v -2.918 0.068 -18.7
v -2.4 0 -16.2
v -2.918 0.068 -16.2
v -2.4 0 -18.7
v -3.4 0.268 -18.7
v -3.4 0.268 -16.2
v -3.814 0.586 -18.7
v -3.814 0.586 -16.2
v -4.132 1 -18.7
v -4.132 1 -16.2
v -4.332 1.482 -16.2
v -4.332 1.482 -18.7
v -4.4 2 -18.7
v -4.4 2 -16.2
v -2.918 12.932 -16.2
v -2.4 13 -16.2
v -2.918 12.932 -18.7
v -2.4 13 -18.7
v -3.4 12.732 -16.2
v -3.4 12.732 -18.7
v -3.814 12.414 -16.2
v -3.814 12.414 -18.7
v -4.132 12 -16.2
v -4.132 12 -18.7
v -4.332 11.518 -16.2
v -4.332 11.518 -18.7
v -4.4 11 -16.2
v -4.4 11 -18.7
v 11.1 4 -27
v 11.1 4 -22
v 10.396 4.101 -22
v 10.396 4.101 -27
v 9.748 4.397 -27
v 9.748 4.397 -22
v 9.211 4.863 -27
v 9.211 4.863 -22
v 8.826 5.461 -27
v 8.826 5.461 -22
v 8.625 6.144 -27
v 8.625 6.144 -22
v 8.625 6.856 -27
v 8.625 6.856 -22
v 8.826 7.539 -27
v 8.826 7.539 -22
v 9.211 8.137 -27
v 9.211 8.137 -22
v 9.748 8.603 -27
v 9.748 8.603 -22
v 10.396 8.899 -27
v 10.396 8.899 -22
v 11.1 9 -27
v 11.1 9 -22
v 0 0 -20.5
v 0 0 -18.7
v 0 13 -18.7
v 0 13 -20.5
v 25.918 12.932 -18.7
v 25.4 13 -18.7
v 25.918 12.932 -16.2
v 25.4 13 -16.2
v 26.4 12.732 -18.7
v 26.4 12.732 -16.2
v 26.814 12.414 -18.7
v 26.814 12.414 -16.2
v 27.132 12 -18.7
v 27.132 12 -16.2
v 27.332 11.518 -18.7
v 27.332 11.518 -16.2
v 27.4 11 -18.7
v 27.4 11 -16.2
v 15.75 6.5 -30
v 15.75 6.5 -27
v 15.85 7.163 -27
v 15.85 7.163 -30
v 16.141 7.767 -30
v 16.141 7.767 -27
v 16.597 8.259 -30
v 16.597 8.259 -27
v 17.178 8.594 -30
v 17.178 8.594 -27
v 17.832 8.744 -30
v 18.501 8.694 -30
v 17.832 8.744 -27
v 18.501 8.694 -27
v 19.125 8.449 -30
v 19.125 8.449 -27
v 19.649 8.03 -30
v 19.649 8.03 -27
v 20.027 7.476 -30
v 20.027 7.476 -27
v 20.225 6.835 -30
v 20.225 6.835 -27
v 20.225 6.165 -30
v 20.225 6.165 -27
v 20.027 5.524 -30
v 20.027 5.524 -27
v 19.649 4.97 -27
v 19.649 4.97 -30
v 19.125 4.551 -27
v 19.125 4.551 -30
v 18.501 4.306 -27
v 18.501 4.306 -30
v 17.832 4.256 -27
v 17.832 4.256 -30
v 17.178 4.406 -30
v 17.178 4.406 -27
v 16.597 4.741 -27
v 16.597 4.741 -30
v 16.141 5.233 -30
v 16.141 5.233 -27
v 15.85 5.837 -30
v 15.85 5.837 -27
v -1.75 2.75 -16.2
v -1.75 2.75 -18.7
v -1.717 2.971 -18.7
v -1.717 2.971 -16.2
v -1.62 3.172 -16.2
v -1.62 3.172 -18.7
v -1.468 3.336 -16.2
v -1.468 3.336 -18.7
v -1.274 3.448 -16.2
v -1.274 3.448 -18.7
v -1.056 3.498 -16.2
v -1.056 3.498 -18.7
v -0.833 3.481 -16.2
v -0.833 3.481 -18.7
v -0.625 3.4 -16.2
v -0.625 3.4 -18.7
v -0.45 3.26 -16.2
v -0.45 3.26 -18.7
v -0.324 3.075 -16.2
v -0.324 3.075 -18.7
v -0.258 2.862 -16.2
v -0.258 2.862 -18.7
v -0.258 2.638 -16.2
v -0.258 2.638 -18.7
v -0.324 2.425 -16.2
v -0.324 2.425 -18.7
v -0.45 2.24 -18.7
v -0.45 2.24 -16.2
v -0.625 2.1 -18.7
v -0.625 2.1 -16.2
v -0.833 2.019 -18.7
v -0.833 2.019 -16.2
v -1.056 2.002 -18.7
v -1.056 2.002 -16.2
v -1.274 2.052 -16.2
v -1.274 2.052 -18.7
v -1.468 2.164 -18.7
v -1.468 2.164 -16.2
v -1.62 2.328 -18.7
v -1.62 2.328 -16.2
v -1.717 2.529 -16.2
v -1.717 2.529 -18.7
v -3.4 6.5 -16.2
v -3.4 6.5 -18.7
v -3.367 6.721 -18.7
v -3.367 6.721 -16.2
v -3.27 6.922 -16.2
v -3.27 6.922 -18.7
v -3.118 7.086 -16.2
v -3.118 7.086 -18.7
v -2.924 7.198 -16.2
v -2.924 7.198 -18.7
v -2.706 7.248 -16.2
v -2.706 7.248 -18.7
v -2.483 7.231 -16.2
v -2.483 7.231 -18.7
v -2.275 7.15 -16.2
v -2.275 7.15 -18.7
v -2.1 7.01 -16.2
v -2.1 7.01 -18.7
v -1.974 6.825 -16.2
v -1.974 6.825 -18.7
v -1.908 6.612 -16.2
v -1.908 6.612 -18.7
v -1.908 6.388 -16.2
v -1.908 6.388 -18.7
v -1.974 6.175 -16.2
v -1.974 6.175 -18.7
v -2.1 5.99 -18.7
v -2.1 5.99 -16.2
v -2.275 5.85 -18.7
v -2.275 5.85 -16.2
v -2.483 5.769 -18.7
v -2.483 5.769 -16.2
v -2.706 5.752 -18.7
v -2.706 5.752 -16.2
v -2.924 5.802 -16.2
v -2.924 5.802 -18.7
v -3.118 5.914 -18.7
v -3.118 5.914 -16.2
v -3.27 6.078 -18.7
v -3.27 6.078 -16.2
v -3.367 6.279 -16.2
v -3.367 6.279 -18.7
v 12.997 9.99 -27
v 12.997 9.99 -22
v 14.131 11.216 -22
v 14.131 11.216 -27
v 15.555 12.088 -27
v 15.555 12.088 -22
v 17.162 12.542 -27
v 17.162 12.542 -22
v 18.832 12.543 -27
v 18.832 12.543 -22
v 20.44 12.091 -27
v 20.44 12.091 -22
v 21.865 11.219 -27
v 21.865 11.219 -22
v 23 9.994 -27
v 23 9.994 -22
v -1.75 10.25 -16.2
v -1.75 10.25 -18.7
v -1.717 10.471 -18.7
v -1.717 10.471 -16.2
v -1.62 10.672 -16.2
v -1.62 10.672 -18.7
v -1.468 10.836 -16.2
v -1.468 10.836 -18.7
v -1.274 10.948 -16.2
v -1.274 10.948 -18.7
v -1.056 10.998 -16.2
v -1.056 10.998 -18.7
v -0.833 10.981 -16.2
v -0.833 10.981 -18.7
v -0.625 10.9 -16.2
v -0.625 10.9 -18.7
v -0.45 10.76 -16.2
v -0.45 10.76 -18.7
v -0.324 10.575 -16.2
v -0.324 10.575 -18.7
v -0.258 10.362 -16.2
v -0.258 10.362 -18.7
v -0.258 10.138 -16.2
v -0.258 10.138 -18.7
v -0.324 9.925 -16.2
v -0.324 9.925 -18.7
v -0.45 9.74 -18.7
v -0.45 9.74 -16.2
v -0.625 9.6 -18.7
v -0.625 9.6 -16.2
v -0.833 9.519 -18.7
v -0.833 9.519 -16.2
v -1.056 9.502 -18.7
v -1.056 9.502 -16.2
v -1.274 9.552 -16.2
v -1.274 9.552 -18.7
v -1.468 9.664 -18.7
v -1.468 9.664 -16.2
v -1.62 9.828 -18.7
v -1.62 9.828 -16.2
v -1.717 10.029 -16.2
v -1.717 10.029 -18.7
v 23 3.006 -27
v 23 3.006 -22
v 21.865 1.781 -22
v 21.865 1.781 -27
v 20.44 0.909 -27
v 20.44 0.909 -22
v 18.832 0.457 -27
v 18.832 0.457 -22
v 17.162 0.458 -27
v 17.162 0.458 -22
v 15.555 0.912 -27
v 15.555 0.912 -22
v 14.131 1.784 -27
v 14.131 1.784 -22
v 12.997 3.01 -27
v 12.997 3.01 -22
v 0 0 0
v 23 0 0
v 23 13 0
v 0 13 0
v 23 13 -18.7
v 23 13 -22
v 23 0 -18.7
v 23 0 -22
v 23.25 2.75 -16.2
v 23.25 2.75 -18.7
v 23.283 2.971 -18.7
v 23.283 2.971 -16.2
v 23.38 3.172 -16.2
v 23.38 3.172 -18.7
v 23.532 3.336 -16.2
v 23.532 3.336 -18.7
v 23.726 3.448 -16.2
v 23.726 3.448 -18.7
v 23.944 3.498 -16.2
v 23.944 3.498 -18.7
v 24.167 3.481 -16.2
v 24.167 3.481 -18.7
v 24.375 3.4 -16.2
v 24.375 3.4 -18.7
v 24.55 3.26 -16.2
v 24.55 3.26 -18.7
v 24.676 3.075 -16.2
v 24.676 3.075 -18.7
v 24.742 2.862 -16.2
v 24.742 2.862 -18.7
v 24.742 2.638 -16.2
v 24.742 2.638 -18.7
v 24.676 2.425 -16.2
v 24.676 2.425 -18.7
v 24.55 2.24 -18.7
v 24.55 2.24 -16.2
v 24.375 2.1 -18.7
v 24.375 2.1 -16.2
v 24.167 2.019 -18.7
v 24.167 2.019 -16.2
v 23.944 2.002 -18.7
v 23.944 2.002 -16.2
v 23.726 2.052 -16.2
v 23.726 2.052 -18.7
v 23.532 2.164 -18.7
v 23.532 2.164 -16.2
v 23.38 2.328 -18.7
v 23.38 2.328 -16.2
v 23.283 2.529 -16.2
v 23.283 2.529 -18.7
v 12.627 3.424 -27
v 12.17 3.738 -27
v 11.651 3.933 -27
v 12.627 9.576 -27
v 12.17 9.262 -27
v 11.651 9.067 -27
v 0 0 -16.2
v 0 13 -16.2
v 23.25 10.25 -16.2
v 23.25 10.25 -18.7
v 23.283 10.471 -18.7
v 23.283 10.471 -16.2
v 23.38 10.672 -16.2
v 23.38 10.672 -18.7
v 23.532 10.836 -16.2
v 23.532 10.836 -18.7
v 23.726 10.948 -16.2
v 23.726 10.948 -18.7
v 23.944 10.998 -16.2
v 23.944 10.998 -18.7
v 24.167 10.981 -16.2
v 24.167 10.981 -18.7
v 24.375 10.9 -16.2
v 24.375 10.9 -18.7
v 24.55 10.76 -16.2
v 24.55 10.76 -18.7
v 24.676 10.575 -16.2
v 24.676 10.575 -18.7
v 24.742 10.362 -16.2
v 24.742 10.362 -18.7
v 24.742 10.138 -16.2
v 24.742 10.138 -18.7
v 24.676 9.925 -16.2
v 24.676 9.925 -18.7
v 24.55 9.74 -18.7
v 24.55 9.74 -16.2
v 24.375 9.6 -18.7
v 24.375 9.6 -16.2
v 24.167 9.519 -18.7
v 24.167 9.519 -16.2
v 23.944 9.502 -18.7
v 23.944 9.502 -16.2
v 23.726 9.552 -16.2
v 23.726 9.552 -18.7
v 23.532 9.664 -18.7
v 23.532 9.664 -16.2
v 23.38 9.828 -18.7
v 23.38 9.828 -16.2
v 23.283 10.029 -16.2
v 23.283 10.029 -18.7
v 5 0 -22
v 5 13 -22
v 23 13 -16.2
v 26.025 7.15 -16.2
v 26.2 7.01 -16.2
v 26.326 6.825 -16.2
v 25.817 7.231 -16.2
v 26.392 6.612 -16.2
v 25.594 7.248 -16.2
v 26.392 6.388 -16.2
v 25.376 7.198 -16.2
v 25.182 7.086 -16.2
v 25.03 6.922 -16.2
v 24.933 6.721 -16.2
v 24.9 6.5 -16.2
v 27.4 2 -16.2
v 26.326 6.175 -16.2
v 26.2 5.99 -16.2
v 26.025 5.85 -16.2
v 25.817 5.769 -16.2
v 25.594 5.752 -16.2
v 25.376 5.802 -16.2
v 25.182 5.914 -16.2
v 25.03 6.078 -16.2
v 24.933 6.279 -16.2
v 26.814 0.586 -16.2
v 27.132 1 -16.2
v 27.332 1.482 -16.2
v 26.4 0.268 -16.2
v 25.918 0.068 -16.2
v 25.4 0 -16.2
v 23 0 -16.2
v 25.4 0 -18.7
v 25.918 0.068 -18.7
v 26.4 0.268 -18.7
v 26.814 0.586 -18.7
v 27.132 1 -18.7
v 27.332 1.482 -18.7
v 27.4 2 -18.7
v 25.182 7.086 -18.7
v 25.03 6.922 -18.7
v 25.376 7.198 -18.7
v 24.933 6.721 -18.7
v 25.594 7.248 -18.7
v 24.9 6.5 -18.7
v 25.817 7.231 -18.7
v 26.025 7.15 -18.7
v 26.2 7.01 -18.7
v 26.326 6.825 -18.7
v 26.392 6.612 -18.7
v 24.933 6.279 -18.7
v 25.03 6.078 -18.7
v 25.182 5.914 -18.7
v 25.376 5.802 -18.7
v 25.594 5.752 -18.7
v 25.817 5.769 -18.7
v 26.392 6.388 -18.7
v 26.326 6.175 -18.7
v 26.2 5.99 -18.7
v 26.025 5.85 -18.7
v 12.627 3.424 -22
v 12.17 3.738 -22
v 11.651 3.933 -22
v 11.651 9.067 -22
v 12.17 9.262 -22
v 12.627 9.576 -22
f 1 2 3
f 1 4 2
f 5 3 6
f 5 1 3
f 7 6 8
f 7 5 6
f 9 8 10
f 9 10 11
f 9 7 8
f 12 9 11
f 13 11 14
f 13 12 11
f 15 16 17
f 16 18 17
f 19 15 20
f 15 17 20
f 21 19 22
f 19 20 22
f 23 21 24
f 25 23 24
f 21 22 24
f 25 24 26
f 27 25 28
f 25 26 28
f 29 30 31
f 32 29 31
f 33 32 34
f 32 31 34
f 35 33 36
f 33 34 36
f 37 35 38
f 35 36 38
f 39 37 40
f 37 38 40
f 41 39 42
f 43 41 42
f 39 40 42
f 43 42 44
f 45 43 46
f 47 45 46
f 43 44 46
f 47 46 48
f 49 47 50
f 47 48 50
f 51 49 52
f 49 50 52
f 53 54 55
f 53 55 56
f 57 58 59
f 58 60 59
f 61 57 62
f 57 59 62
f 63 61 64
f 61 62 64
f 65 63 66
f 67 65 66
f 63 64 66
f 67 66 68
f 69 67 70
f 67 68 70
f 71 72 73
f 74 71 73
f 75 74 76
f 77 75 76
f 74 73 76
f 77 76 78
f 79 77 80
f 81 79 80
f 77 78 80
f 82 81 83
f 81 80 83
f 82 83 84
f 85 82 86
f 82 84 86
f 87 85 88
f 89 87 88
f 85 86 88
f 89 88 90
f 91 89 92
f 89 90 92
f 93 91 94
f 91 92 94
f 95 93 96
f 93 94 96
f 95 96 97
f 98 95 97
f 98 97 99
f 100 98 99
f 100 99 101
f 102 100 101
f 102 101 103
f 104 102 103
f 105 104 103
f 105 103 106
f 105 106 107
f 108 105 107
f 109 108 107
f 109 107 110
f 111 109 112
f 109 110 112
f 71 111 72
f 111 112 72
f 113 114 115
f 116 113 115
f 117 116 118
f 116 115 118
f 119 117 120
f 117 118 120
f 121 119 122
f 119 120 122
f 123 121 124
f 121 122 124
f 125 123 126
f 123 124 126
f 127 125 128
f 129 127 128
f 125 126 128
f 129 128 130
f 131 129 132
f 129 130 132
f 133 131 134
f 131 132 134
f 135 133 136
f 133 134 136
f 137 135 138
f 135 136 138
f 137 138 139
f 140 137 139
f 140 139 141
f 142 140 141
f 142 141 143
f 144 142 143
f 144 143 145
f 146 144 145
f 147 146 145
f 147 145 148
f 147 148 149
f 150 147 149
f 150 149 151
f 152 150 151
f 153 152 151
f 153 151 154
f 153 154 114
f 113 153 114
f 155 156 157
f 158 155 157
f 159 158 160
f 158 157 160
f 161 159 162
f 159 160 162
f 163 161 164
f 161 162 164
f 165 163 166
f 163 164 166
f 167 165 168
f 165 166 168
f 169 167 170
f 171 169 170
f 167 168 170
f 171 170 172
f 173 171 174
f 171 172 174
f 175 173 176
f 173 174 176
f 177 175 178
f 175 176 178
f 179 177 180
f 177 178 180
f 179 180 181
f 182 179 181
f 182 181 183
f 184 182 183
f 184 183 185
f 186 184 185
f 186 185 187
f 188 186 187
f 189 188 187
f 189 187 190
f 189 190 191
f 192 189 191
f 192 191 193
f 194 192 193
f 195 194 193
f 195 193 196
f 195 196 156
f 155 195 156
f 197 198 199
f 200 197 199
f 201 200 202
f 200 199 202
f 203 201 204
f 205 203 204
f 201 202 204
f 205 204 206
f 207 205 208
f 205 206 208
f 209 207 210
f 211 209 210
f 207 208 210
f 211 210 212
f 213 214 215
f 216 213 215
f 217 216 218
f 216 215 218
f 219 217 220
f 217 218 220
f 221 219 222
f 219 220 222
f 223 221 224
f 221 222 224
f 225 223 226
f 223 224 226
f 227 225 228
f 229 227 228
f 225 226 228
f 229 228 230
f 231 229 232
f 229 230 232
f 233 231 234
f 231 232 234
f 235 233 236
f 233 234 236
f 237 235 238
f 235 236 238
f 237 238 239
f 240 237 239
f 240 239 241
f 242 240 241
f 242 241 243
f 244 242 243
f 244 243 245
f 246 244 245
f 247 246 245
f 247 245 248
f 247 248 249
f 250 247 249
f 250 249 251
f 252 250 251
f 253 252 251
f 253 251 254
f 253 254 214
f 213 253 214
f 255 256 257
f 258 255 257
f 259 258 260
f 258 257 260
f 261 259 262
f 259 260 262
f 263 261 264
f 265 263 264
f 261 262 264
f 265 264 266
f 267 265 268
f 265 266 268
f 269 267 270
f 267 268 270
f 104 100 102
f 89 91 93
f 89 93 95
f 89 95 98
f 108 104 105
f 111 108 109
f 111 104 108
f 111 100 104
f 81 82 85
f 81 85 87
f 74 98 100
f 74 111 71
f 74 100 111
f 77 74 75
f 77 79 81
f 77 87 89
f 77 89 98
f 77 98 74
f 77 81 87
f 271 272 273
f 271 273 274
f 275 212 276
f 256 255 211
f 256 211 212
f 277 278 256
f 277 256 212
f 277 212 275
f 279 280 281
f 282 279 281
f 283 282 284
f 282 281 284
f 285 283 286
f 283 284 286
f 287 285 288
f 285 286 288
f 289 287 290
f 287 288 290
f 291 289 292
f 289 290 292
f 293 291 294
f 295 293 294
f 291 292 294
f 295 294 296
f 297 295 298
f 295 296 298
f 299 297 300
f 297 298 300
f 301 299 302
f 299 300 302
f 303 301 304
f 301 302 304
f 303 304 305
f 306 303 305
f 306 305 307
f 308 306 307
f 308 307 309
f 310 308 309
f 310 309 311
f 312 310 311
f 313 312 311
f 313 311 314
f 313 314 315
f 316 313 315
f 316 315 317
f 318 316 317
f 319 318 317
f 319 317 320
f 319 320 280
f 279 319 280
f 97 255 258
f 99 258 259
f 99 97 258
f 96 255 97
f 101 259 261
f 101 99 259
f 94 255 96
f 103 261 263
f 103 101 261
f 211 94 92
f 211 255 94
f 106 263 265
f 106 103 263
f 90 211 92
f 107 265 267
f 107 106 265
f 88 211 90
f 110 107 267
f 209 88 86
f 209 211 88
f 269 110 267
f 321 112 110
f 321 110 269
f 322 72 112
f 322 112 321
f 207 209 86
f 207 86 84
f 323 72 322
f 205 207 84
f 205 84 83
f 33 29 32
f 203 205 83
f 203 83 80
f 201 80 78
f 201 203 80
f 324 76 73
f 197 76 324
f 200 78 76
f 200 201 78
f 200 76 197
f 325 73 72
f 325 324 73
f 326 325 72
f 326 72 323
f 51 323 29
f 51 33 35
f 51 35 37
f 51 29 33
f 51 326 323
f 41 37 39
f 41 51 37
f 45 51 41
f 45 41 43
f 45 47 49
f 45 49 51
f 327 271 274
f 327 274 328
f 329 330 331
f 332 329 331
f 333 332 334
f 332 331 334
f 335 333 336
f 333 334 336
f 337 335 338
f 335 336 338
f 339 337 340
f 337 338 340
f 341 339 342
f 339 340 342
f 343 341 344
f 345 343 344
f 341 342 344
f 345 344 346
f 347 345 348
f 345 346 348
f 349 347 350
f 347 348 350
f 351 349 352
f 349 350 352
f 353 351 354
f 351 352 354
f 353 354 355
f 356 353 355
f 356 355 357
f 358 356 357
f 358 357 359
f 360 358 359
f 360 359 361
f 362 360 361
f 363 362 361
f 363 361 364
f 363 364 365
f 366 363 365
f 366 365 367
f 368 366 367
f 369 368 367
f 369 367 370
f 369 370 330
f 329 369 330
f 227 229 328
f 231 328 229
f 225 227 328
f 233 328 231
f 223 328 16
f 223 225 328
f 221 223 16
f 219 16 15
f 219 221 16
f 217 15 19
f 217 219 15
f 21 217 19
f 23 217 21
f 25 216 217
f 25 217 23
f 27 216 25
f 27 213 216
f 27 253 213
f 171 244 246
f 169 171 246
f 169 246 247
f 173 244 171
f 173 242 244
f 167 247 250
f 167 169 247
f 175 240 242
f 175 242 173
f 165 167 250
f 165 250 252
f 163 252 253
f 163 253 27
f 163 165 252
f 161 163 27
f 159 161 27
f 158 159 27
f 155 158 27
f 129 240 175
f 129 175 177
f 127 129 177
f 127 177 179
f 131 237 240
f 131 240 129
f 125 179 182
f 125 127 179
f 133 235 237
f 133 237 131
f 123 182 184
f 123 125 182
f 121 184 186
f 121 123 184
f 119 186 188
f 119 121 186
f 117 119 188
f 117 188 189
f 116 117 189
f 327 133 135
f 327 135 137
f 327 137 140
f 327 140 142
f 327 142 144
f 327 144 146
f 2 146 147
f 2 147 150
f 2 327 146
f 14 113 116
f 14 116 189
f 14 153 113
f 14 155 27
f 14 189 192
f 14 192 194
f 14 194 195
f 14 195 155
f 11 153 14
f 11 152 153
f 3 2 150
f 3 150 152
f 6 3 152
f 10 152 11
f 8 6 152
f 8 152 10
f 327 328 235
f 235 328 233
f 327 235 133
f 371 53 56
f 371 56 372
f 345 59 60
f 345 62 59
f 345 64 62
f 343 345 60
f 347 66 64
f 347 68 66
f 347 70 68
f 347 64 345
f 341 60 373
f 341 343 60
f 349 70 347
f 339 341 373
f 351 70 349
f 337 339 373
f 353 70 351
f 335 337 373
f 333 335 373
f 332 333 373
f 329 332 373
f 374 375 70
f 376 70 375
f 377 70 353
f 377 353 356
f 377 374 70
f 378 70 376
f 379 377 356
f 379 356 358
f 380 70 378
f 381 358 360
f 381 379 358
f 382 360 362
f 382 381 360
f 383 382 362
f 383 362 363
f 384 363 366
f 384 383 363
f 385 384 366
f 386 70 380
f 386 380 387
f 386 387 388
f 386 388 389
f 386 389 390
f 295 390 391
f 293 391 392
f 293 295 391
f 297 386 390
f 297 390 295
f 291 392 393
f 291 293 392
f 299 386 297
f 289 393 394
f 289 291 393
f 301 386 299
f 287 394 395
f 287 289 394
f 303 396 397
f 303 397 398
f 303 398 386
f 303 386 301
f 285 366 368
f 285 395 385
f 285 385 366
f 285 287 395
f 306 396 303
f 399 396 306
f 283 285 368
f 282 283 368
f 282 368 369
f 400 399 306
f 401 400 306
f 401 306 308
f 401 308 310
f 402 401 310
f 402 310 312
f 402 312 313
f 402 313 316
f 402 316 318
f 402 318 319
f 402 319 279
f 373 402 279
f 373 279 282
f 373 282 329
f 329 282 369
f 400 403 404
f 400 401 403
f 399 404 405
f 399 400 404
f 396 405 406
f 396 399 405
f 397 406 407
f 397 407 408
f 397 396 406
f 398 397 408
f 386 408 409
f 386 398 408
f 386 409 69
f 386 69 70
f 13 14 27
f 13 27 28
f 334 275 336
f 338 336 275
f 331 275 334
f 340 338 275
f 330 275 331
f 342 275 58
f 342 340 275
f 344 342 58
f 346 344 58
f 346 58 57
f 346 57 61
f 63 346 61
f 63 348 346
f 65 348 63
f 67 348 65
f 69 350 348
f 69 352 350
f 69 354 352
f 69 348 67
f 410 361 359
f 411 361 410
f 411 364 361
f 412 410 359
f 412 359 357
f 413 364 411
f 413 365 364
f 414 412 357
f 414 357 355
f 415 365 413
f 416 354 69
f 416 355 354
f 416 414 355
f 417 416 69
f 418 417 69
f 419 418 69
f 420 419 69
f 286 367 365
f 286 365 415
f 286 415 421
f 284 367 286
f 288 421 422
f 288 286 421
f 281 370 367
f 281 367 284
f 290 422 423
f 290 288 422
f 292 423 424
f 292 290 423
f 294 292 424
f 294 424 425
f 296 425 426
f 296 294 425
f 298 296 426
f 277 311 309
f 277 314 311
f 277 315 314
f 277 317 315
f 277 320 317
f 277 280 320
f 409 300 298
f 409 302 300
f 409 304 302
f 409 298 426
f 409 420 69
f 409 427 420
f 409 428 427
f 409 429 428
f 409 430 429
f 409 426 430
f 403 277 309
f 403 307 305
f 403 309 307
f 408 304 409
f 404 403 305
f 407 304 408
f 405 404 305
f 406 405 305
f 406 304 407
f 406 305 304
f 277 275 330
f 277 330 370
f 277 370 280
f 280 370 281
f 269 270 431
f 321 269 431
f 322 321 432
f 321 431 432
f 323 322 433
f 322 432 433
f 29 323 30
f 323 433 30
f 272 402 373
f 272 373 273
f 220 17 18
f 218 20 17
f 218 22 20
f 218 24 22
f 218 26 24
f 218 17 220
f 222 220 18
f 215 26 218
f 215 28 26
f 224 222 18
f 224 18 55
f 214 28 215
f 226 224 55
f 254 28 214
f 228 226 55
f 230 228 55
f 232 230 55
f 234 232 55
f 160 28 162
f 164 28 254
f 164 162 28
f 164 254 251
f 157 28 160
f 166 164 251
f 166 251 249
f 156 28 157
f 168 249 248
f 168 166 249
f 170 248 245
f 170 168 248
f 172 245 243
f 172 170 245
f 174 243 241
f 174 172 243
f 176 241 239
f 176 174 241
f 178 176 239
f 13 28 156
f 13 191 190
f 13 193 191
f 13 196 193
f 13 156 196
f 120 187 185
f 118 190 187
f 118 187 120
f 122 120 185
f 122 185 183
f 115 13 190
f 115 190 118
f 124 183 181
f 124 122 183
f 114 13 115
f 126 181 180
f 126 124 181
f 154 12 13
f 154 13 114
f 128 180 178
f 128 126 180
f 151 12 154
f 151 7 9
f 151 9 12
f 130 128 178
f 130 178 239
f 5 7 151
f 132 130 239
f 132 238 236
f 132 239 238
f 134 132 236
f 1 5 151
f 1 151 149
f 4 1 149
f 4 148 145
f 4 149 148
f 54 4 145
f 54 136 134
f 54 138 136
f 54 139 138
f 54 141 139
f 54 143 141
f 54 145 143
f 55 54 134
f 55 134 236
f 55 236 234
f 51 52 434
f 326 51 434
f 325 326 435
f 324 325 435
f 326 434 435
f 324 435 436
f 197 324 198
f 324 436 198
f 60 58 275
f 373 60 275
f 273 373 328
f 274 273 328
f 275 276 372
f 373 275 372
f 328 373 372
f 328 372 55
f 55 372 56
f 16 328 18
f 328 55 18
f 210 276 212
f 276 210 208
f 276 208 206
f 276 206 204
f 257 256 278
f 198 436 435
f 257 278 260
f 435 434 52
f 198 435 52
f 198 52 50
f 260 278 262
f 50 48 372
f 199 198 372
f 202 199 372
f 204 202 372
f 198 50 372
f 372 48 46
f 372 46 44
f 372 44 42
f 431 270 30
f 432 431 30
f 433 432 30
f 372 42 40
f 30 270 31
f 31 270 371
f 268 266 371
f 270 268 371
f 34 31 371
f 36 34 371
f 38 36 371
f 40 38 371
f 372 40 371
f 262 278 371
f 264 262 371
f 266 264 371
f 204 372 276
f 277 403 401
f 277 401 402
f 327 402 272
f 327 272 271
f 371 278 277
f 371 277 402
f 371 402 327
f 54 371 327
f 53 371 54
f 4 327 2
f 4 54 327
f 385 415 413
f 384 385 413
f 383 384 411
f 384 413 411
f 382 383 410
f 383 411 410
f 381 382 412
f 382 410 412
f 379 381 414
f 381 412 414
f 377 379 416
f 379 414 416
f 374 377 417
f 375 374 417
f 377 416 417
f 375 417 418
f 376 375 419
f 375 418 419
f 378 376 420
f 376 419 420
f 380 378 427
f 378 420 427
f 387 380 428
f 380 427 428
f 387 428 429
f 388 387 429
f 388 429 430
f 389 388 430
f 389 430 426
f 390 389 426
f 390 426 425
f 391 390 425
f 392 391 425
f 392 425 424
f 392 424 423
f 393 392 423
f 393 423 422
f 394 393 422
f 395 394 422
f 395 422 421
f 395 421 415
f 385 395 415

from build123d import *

# Parameters (mm, degrees)
BOSS_EXTRUDE1_DEPTH = 13
BOSS_EXTRUDE2_DEPTH = 5
FILLET1_R           = 2
SKETCH3_R           = 0.75
CUT_EXTRUDE1_DEPTH  = 4.9
SKETCH4_R           = 2.25
BOSS_EXTRUDE3_DEPTH = 3


with BuildPart() as part:
    # Sketch1 → Boss-Extrude1 (new body)
    with BuildSketch(Plane(origin=(0, 0, 0), x_dir=(1, 0, 0), z_dir=(0, 1, 0))):
        Polygon((0, 20.5), (5, 22), (11.5, 22), (23, 22), (23, 18.7), (27.4, 18.7), (27.4, 16.2), (23, 16.2), (23, 0), (0, 0), (0, 16.2), (-4.4, 16.2), (-4.4, 18.7), (0, 18.7), align=None)
    extrude(amount=BOSS_EXTRUDE1_DEPTH)

    # Sketch2 → Boss-Extrude2 (add)
    with BuildSketch(Plane(origin=(0, 0, -22), x_dir=(-1, 0, 0), z_dir=(0, 0, -1))):
        with BuildLine():
            Line((-23, 9.994281042), (-23, 3.005718958))
            ThreePointArc((-23, 3.005718958), (-17.997144773, 0.400000668), (-12.996731055, 3.010401189))
            ThreePointArc((-12.996731055, 3.010401189), (-12.16968389, 3.737727457), (-11.1, 4))
            ThreePointArc((-11.1, 4), (-8.6, 6.5), (-11.1, 9))
            ThreePointArc((-11.1, 9), (-12.16968389, 9.262272543), (-12.996731055, 9.989598811))
            ThreePointArc((-12.996731055, 9.989598811), (-17.997144773, 12.599999332), (-23, 9.994281042))
        make_face()
    extrude(amount=BOSS_EXTRUDE2_DEPTH)

    # Fillet1
    fillet1_edges = [part.edges().sort_by_distance(p)[0] for p in [
        (-4.4, 0, -17.45),
        (27.4, 13, -17.45),
        (27.4, 0, -17.45),
        (-4.4, 13, -17.45),
    ]]
    fillet(fillet1_edges, radius=FILLET1_R)

    # Sketch3 → Cut-Extrude1 (cut)
    with BuildSketch(Plane(origin=(0, 0, -18.7), x_dir=(-1, 0, 0), z_dir=(0, 0, -1))):
        with Locations((-25.65, 6.5)):
            Circle(SKETCH3_R)
        with Locations((-24, 10.25)):
            Circle(SKETCH3_R)
        with Locations((-24, 2.75)):
            Circle(SKETCH3_R)
        with Locations((1, 2.75)):
            Circle(SKETCH3_R)
        with Locations((2.65, 6.5)):
            Circle(SKETCH3_R)
        with Locations((1, 10.25)):
            Circle(SKETCH3_R)
    extrude(amount=-CUT_EXTRUDE1_DEPTH, mode=Mode.SUBTRACT)

    # Sketch4 → Boss-Extrude3 (add)
    with BuildSketch(Plane(origin=(0, 0, -27), x_dir=(-1, 0, 0), z_dir=(0, 0, -1))):
        with Locations((-18, 6.5)):
            Circle(SKETCH4_R)
    extrude(amount=BOSS_EXTRUDE3_DEPTH)


solid = part.part
